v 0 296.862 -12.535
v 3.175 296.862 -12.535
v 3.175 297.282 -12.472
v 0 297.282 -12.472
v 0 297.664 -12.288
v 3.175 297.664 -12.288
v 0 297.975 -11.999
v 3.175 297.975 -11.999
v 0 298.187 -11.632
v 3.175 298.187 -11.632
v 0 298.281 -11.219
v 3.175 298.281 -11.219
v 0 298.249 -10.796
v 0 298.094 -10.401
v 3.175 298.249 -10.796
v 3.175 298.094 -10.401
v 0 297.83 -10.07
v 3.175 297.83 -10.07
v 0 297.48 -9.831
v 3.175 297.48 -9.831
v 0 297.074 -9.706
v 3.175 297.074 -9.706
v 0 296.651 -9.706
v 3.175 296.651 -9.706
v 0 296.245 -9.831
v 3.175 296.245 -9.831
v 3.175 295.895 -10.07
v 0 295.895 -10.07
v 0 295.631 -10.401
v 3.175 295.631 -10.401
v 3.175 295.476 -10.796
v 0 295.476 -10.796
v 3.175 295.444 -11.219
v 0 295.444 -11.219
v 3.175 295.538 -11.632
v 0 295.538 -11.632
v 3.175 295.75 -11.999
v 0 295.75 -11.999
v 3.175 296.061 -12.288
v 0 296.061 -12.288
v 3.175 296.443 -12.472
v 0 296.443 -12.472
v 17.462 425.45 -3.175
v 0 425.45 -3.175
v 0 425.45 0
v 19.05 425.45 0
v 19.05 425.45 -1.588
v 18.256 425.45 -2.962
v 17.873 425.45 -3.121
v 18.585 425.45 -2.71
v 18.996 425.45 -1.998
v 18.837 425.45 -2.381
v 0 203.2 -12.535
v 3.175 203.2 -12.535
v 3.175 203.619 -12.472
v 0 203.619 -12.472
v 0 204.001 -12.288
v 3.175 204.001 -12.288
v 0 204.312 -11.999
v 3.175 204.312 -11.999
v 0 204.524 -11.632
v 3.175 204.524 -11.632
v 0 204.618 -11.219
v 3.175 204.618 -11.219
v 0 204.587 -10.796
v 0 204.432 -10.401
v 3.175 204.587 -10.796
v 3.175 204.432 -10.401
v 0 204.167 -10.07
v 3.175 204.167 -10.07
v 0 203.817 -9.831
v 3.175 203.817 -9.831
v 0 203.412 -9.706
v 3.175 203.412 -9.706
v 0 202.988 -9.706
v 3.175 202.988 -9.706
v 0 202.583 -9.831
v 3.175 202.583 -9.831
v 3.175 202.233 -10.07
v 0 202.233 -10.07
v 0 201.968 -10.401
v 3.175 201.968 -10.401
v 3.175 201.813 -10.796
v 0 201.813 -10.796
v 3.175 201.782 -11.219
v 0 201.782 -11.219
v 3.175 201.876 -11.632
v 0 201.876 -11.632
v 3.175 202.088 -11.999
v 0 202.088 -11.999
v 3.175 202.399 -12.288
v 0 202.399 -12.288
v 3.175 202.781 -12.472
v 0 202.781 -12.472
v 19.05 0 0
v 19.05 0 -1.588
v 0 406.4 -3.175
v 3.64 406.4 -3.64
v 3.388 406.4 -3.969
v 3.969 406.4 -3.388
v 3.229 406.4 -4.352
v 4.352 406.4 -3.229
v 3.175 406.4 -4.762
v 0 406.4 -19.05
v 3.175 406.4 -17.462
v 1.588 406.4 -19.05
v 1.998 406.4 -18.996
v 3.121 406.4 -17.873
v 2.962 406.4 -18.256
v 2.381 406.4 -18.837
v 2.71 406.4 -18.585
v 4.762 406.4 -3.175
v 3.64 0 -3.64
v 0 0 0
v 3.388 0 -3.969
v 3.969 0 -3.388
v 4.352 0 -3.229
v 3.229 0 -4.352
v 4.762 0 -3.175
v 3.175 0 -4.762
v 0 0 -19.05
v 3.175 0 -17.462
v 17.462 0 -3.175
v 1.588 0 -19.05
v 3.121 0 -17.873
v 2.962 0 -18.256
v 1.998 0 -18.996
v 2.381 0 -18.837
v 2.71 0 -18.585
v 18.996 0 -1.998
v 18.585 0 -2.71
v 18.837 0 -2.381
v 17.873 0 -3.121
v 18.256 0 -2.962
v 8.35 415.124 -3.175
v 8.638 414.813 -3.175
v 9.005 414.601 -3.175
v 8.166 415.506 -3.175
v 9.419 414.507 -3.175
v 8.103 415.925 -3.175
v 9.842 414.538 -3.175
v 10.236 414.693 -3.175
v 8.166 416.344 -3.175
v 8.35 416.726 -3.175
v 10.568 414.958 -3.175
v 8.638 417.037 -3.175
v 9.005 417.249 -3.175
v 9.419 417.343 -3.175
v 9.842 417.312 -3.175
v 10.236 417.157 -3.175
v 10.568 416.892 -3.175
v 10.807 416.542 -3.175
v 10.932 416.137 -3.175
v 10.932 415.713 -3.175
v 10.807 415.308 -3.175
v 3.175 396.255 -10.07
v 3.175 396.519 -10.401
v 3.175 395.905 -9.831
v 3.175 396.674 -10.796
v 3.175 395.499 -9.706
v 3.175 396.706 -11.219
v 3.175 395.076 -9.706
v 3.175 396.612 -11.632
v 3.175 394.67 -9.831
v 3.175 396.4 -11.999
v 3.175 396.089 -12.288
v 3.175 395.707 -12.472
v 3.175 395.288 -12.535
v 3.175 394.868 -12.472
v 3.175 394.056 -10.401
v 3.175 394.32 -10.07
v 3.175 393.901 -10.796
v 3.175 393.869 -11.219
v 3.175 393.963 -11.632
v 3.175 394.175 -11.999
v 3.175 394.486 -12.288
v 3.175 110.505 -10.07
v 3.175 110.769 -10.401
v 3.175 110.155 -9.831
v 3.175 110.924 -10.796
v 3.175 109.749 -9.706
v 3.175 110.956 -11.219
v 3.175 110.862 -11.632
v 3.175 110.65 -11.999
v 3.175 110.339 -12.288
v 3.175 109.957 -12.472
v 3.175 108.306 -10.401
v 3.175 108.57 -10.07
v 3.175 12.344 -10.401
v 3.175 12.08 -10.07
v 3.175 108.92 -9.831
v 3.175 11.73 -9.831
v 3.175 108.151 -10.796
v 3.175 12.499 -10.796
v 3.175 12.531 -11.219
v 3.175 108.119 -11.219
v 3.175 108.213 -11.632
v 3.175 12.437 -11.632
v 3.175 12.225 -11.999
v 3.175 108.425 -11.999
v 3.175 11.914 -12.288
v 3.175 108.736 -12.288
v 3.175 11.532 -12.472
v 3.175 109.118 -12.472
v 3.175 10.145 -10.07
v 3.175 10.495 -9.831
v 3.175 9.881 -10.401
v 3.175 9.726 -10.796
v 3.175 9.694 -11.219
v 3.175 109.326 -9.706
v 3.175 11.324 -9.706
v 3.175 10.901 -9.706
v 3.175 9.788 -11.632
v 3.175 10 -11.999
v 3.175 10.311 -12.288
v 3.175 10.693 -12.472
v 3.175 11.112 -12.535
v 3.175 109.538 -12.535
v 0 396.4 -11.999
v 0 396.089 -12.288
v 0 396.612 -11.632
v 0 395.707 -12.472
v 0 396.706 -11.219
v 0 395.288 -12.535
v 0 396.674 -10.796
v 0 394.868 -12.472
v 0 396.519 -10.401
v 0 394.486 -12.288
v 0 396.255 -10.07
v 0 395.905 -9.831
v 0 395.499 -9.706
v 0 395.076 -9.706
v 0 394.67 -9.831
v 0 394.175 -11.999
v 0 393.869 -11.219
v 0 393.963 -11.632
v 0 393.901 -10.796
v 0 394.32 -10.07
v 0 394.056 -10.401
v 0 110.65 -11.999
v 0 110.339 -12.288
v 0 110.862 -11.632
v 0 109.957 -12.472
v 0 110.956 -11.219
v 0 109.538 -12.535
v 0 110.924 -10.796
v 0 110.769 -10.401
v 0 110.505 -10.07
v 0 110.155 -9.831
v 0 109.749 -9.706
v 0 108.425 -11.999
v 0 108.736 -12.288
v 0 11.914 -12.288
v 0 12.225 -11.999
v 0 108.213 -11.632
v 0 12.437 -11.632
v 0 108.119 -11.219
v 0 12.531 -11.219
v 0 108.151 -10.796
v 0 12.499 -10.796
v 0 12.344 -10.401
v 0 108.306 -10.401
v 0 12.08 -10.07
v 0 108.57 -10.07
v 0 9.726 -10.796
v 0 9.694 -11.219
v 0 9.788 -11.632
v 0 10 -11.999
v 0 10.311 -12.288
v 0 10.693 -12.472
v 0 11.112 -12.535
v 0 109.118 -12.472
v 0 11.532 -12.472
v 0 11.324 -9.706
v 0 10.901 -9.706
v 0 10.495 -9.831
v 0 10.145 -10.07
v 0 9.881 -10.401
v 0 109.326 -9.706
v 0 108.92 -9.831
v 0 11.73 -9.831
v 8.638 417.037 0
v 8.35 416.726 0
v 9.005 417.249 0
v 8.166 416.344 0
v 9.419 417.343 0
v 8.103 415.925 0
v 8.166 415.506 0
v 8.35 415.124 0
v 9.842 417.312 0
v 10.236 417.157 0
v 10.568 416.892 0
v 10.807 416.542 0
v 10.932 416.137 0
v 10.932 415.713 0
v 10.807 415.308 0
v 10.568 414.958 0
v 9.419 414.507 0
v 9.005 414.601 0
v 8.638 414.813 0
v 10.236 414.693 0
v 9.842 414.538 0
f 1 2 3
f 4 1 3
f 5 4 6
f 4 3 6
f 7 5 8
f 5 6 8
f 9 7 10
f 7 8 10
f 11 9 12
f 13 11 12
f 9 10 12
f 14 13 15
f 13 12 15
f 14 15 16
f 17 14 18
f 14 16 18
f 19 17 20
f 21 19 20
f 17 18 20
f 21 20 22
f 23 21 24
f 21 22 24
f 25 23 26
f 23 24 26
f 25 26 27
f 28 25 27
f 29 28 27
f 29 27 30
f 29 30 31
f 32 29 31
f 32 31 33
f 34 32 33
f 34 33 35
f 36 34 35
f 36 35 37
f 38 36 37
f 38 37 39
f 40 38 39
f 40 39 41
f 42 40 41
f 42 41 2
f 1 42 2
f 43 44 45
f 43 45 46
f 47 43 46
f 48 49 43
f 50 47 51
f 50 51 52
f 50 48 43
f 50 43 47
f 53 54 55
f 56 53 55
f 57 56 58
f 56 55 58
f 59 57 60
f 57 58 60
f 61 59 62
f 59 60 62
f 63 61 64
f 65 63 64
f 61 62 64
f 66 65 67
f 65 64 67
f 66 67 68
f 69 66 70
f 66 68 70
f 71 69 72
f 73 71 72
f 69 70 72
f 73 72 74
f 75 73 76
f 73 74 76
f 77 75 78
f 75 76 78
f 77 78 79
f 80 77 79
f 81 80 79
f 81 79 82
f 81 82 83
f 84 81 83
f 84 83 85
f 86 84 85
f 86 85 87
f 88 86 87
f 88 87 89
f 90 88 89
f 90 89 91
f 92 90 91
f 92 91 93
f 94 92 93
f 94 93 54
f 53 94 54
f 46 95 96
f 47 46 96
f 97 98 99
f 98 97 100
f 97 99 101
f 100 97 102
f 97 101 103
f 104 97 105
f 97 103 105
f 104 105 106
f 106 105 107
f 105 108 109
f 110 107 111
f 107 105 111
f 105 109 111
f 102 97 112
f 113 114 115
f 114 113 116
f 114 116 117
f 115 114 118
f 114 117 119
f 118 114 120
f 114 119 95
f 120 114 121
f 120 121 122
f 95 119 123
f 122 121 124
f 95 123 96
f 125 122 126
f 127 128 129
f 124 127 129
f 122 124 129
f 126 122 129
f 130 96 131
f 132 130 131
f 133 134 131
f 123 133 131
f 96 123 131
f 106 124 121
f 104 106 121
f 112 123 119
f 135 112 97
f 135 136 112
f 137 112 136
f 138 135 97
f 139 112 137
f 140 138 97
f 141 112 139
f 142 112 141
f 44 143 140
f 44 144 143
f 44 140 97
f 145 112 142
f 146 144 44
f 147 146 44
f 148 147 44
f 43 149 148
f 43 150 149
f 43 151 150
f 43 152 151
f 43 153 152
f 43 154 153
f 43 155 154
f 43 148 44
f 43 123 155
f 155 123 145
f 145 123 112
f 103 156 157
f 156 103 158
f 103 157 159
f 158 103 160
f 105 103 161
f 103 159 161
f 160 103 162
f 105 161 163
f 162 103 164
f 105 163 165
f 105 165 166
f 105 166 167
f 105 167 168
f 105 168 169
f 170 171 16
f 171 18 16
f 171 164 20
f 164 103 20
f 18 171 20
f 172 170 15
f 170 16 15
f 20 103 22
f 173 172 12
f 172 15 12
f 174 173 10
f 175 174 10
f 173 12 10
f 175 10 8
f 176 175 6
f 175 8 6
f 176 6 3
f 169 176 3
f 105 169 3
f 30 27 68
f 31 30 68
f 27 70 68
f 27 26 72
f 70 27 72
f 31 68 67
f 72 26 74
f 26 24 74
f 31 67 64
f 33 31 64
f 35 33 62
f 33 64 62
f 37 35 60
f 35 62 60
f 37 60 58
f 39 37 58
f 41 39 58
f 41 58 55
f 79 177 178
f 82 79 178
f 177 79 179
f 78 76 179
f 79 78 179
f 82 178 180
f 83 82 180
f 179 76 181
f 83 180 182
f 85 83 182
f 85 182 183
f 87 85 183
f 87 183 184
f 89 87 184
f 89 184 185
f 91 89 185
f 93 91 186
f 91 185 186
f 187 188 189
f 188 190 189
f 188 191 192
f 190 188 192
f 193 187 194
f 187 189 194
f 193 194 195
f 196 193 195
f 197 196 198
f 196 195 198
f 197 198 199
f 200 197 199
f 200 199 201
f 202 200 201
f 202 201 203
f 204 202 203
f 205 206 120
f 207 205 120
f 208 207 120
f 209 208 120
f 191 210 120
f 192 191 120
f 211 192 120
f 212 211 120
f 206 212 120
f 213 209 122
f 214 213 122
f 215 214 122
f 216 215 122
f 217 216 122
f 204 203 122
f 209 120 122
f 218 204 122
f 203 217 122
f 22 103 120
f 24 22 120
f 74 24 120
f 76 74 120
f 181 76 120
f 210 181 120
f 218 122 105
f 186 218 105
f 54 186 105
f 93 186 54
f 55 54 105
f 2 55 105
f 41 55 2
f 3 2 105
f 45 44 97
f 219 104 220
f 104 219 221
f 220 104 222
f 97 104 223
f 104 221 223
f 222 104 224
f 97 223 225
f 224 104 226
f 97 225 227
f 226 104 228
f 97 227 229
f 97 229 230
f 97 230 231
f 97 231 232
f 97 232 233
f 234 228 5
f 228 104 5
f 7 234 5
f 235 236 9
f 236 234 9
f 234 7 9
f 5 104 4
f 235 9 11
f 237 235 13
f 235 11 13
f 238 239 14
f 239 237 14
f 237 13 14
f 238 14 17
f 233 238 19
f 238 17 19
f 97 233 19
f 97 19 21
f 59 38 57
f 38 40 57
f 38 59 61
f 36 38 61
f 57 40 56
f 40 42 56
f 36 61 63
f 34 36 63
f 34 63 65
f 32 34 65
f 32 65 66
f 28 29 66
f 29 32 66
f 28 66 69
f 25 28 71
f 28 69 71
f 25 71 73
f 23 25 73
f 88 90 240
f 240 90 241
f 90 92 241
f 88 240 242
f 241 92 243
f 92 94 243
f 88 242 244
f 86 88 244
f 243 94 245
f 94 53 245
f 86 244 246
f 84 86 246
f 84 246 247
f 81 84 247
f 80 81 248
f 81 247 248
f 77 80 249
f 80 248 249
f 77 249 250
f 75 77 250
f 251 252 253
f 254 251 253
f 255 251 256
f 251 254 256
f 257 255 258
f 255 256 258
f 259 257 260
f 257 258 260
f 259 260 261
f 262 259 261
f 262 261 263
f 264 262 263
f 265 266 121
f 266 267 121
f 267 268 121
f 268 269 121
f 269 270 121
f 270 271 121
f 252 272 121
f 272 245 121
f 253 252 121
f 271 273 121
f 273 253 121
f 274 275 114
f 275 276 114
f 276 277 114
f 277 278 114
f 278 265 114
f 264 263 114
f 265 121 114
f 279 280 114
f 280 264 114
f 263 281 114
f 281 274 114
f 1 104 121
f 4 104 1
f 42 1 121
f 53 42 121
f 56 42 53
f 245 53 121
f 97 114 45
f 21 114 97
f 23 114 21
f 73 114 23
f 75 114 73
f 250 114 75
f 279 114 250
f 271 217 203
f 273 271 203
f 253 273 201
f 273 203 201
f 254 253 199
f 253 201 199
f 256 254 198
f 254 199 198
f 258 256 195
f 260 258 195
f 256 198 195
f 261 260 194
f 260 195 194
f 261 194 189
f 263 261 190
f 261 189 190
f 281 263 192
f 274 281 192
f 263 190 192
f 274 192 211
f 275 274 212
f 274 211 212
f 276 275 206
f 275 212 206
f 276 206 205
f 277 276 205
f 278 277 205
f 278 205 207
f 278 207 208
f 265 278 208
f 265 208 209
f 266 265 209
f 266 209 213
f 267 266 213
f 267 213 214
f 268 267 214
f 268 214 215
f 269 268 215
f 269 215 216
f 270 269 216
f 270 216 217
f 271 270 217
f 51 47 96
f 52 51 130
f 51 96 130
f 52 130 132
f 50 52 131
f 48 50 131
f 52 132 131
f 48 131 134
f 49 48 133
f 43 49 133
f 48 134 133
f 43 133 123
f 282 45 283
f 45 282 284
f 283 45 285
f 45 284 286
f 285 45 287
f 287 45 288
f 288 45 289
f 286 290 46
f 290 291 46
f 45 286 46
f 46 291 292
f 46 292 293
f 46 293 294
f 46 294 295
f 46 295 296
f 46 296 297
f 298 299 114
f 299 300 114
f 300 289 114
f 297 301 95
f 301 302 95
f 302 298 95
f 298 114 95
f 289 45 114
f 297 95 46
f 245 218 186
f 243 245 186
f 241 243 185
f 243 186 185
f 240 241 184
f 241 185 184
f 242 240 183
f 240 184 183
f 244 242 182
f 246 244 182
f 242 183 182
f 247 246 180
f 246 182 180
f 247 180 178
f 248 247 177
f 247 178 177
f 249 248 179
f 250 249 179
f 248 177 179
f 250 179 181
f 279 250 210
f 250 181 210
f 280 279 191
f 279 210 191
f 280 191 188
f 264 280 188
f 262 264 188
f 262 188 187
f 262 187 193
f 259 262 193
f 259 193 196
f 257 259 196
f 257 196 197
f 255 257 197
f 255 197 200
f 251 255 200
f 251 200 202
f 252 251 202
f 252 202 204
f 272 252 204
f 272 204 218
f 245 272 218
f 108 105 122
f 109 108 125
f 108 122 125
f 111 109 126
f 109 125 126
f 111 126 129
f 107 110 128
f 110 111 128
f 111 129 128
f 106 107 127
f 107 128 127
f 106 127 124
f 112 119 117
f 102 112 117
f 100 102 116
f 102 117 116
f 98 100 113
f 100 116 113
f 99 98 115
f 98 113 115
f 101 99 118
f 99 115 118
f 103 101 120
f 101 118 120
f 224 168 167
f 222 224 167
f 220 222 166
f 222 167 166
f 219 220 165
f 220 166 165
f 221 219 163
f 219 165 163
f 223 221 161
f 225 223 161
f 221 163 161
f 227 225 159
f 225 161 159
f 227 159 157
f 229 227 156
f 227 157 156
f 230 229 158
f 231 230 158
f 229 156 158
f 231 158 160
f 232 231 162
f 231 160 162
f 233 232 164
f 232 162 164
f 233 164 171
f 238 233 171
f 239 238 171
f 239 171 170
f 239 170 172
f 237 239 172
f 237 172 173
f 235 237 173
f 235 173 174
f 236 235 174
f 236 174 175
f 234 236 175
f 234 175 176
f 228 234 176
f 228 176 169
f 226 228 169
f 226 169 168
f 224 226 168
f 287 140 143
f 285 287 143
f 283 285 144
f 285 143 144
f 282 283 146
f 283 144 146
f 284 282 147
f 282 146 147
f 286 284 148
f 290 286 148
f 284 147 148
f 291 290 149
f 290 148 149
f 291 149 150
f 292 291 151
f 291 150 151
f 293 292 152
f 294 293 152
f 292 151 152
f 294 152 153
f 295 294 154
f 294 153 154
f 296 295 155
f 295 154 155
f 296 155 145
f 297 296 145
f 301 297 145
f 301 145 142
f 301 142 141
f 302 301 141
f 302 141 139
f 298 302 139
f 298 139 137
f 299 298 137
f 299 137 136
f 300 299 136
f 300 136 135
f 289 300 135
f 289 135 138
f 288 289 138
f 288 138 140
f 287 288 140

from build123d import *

# Parameters (mm, degrees)
BOSS_EXTRUDE1_DEPTH = 431.8
SKETCH4_W           = 15.875
SKETCH4_H           = 25.4
CUT_EXTRUDE1_DEPTH  = 6.35
SKETCH5_W           = 1.5875
SKETCH5_H           = 25.4
CUT_EXTRUDE2_DEPTH  = 6.35
SKETCH6_R           = 1.4224
CUT_EXTRUDE3_DEPTH  = 5.08
CUT_EXTRUDE4_START  = -6.35
CUT_EXTRUDE4_DEPTH  = 6.35
SKETCH8_R           = 1.4224
CUT_EXTRUDE5_DEPTH  = 5.08


with BuildPart() as part:
    # Sketch2 → Boss-Extrude1 (new body)
    with BuildSketch(Plane(origin=(0, 0, 0), x_dir=(1, 0, 0), z_dir=(0, 1, 0))):
        with BuildLine():
            Line((0, 0), (19.05, 0))
            Line((19.05, 0), (19.05, 1.5875))
            ThreePointArc((19.05, 1.5875), (18.585032015, 2.710032015), (17.4625, 3.175))
            Line((17.4625, 3.175), (4.7625, 3.175))
            ThreePointArc((4.7625, 3.175), (3.639967985, 3.639967985), (3.175, 4.7625))
            Line((3.175, 4.7625), (3.175, 17.4625))
            ThreePointArc((3.175, 17.4625), (2.710032015, 18.585032015), (1.5875, 19.05))
            Line((1.5875, 19.05), (0, 19.05))
            Line((0, 19.05), (0, 0))
        make_face()
    extrude(amount=BOSS_EXTRUDE1_DEPTH)

    # Sketch4 → Cut-Extrude1 (cut)
    with BuildSketch(Plane(origin=(3.175, 0, 0), x_dir=(0, 0, -1), z_dir=(1, 0, 0))):
        with Locations((11.1125, 419.1)):
            Rectangle(SKETCH4_W, SKETCH4_H)
    extrude(amount=-CUT_EXTRUDE1_DEPTH, mode=Mode.SUBTRACT)

    # Sketch5 → Cut-Extrude2 (cut)
    with BuildSketch(Plane.ZY.offset(-3.175)):
        with Locations((-3.96875, 419.1)):
            Rectangle(SKETCH5_W, SKETCH5_H)
    extrude(amount=-CUT_EXTRUDE2_DEPTH, mode=Mode.SUBTRACT)

    # Sketch6 → Cut-Extrude3 (cut)
    with BuildSketch(Plane(origin=(3.175, 0, 0), x_dir=(0, 0, -1), z_dir=(1, 0, 0))):
        with Locations((11.1125, 109.5375)):
            Circle(SKETCH6_R)
        with Locations((11.1125, 203.2)):
            Circle(SKETCH6_R)
        with Locations((11.1125, 296.8625)):
            Circle(SKETCH6_R)
        with Locations((11.1125, 11.1125)):
            Circle(SKETCH6_R)
        with Locations((11.1125, 395.2875)):
            Circle(SKETCH6_R)
    extrude(amount=-CUT_EXTRUDE3_DEPTH, mode=Mode.SUBTRACT)

    # Sketch7 → Cut-Extrude4 (cut)
    with BuildSketch(Plane(origin=(0, 431.8, 0), x_dir=(1, 0, 0), z_dir=(0, 1, 0)).offset(CUT_EXTRUDE4_START)):
        with BuildLine():
            Line((17.4625, 3.175), (0, 3.175))
            Line((0, 3.175), (0, 0))
            Line((0, 0), (19.05, 0))
            Line((19.05, 0), (19.05, 1.5875))
            ThreePointArc((19.05, 1.5875), (18.585032015, 2.710032015), (17.4625, 3.175))
        make_face()
    extrude(amount=CUT_EXTRUDE4_DEPTH, mode=Mode.SUBTRACT)

    # Sketch8 → Cut-Extrude5 (cut)
    with BuildSketch(Plane(origin=(0, 0, -3.175), x_dir=(-1, 0, 0), z_dir=(0, 0, -1))):
        with Locations((-9.525, 415.925)):
            Circle(SKETCH8_R)
    extrude(amount=-CUT_EXTRUDE5_DEPTH, mode=Mode.SUBTRACT)


solid = part.part
